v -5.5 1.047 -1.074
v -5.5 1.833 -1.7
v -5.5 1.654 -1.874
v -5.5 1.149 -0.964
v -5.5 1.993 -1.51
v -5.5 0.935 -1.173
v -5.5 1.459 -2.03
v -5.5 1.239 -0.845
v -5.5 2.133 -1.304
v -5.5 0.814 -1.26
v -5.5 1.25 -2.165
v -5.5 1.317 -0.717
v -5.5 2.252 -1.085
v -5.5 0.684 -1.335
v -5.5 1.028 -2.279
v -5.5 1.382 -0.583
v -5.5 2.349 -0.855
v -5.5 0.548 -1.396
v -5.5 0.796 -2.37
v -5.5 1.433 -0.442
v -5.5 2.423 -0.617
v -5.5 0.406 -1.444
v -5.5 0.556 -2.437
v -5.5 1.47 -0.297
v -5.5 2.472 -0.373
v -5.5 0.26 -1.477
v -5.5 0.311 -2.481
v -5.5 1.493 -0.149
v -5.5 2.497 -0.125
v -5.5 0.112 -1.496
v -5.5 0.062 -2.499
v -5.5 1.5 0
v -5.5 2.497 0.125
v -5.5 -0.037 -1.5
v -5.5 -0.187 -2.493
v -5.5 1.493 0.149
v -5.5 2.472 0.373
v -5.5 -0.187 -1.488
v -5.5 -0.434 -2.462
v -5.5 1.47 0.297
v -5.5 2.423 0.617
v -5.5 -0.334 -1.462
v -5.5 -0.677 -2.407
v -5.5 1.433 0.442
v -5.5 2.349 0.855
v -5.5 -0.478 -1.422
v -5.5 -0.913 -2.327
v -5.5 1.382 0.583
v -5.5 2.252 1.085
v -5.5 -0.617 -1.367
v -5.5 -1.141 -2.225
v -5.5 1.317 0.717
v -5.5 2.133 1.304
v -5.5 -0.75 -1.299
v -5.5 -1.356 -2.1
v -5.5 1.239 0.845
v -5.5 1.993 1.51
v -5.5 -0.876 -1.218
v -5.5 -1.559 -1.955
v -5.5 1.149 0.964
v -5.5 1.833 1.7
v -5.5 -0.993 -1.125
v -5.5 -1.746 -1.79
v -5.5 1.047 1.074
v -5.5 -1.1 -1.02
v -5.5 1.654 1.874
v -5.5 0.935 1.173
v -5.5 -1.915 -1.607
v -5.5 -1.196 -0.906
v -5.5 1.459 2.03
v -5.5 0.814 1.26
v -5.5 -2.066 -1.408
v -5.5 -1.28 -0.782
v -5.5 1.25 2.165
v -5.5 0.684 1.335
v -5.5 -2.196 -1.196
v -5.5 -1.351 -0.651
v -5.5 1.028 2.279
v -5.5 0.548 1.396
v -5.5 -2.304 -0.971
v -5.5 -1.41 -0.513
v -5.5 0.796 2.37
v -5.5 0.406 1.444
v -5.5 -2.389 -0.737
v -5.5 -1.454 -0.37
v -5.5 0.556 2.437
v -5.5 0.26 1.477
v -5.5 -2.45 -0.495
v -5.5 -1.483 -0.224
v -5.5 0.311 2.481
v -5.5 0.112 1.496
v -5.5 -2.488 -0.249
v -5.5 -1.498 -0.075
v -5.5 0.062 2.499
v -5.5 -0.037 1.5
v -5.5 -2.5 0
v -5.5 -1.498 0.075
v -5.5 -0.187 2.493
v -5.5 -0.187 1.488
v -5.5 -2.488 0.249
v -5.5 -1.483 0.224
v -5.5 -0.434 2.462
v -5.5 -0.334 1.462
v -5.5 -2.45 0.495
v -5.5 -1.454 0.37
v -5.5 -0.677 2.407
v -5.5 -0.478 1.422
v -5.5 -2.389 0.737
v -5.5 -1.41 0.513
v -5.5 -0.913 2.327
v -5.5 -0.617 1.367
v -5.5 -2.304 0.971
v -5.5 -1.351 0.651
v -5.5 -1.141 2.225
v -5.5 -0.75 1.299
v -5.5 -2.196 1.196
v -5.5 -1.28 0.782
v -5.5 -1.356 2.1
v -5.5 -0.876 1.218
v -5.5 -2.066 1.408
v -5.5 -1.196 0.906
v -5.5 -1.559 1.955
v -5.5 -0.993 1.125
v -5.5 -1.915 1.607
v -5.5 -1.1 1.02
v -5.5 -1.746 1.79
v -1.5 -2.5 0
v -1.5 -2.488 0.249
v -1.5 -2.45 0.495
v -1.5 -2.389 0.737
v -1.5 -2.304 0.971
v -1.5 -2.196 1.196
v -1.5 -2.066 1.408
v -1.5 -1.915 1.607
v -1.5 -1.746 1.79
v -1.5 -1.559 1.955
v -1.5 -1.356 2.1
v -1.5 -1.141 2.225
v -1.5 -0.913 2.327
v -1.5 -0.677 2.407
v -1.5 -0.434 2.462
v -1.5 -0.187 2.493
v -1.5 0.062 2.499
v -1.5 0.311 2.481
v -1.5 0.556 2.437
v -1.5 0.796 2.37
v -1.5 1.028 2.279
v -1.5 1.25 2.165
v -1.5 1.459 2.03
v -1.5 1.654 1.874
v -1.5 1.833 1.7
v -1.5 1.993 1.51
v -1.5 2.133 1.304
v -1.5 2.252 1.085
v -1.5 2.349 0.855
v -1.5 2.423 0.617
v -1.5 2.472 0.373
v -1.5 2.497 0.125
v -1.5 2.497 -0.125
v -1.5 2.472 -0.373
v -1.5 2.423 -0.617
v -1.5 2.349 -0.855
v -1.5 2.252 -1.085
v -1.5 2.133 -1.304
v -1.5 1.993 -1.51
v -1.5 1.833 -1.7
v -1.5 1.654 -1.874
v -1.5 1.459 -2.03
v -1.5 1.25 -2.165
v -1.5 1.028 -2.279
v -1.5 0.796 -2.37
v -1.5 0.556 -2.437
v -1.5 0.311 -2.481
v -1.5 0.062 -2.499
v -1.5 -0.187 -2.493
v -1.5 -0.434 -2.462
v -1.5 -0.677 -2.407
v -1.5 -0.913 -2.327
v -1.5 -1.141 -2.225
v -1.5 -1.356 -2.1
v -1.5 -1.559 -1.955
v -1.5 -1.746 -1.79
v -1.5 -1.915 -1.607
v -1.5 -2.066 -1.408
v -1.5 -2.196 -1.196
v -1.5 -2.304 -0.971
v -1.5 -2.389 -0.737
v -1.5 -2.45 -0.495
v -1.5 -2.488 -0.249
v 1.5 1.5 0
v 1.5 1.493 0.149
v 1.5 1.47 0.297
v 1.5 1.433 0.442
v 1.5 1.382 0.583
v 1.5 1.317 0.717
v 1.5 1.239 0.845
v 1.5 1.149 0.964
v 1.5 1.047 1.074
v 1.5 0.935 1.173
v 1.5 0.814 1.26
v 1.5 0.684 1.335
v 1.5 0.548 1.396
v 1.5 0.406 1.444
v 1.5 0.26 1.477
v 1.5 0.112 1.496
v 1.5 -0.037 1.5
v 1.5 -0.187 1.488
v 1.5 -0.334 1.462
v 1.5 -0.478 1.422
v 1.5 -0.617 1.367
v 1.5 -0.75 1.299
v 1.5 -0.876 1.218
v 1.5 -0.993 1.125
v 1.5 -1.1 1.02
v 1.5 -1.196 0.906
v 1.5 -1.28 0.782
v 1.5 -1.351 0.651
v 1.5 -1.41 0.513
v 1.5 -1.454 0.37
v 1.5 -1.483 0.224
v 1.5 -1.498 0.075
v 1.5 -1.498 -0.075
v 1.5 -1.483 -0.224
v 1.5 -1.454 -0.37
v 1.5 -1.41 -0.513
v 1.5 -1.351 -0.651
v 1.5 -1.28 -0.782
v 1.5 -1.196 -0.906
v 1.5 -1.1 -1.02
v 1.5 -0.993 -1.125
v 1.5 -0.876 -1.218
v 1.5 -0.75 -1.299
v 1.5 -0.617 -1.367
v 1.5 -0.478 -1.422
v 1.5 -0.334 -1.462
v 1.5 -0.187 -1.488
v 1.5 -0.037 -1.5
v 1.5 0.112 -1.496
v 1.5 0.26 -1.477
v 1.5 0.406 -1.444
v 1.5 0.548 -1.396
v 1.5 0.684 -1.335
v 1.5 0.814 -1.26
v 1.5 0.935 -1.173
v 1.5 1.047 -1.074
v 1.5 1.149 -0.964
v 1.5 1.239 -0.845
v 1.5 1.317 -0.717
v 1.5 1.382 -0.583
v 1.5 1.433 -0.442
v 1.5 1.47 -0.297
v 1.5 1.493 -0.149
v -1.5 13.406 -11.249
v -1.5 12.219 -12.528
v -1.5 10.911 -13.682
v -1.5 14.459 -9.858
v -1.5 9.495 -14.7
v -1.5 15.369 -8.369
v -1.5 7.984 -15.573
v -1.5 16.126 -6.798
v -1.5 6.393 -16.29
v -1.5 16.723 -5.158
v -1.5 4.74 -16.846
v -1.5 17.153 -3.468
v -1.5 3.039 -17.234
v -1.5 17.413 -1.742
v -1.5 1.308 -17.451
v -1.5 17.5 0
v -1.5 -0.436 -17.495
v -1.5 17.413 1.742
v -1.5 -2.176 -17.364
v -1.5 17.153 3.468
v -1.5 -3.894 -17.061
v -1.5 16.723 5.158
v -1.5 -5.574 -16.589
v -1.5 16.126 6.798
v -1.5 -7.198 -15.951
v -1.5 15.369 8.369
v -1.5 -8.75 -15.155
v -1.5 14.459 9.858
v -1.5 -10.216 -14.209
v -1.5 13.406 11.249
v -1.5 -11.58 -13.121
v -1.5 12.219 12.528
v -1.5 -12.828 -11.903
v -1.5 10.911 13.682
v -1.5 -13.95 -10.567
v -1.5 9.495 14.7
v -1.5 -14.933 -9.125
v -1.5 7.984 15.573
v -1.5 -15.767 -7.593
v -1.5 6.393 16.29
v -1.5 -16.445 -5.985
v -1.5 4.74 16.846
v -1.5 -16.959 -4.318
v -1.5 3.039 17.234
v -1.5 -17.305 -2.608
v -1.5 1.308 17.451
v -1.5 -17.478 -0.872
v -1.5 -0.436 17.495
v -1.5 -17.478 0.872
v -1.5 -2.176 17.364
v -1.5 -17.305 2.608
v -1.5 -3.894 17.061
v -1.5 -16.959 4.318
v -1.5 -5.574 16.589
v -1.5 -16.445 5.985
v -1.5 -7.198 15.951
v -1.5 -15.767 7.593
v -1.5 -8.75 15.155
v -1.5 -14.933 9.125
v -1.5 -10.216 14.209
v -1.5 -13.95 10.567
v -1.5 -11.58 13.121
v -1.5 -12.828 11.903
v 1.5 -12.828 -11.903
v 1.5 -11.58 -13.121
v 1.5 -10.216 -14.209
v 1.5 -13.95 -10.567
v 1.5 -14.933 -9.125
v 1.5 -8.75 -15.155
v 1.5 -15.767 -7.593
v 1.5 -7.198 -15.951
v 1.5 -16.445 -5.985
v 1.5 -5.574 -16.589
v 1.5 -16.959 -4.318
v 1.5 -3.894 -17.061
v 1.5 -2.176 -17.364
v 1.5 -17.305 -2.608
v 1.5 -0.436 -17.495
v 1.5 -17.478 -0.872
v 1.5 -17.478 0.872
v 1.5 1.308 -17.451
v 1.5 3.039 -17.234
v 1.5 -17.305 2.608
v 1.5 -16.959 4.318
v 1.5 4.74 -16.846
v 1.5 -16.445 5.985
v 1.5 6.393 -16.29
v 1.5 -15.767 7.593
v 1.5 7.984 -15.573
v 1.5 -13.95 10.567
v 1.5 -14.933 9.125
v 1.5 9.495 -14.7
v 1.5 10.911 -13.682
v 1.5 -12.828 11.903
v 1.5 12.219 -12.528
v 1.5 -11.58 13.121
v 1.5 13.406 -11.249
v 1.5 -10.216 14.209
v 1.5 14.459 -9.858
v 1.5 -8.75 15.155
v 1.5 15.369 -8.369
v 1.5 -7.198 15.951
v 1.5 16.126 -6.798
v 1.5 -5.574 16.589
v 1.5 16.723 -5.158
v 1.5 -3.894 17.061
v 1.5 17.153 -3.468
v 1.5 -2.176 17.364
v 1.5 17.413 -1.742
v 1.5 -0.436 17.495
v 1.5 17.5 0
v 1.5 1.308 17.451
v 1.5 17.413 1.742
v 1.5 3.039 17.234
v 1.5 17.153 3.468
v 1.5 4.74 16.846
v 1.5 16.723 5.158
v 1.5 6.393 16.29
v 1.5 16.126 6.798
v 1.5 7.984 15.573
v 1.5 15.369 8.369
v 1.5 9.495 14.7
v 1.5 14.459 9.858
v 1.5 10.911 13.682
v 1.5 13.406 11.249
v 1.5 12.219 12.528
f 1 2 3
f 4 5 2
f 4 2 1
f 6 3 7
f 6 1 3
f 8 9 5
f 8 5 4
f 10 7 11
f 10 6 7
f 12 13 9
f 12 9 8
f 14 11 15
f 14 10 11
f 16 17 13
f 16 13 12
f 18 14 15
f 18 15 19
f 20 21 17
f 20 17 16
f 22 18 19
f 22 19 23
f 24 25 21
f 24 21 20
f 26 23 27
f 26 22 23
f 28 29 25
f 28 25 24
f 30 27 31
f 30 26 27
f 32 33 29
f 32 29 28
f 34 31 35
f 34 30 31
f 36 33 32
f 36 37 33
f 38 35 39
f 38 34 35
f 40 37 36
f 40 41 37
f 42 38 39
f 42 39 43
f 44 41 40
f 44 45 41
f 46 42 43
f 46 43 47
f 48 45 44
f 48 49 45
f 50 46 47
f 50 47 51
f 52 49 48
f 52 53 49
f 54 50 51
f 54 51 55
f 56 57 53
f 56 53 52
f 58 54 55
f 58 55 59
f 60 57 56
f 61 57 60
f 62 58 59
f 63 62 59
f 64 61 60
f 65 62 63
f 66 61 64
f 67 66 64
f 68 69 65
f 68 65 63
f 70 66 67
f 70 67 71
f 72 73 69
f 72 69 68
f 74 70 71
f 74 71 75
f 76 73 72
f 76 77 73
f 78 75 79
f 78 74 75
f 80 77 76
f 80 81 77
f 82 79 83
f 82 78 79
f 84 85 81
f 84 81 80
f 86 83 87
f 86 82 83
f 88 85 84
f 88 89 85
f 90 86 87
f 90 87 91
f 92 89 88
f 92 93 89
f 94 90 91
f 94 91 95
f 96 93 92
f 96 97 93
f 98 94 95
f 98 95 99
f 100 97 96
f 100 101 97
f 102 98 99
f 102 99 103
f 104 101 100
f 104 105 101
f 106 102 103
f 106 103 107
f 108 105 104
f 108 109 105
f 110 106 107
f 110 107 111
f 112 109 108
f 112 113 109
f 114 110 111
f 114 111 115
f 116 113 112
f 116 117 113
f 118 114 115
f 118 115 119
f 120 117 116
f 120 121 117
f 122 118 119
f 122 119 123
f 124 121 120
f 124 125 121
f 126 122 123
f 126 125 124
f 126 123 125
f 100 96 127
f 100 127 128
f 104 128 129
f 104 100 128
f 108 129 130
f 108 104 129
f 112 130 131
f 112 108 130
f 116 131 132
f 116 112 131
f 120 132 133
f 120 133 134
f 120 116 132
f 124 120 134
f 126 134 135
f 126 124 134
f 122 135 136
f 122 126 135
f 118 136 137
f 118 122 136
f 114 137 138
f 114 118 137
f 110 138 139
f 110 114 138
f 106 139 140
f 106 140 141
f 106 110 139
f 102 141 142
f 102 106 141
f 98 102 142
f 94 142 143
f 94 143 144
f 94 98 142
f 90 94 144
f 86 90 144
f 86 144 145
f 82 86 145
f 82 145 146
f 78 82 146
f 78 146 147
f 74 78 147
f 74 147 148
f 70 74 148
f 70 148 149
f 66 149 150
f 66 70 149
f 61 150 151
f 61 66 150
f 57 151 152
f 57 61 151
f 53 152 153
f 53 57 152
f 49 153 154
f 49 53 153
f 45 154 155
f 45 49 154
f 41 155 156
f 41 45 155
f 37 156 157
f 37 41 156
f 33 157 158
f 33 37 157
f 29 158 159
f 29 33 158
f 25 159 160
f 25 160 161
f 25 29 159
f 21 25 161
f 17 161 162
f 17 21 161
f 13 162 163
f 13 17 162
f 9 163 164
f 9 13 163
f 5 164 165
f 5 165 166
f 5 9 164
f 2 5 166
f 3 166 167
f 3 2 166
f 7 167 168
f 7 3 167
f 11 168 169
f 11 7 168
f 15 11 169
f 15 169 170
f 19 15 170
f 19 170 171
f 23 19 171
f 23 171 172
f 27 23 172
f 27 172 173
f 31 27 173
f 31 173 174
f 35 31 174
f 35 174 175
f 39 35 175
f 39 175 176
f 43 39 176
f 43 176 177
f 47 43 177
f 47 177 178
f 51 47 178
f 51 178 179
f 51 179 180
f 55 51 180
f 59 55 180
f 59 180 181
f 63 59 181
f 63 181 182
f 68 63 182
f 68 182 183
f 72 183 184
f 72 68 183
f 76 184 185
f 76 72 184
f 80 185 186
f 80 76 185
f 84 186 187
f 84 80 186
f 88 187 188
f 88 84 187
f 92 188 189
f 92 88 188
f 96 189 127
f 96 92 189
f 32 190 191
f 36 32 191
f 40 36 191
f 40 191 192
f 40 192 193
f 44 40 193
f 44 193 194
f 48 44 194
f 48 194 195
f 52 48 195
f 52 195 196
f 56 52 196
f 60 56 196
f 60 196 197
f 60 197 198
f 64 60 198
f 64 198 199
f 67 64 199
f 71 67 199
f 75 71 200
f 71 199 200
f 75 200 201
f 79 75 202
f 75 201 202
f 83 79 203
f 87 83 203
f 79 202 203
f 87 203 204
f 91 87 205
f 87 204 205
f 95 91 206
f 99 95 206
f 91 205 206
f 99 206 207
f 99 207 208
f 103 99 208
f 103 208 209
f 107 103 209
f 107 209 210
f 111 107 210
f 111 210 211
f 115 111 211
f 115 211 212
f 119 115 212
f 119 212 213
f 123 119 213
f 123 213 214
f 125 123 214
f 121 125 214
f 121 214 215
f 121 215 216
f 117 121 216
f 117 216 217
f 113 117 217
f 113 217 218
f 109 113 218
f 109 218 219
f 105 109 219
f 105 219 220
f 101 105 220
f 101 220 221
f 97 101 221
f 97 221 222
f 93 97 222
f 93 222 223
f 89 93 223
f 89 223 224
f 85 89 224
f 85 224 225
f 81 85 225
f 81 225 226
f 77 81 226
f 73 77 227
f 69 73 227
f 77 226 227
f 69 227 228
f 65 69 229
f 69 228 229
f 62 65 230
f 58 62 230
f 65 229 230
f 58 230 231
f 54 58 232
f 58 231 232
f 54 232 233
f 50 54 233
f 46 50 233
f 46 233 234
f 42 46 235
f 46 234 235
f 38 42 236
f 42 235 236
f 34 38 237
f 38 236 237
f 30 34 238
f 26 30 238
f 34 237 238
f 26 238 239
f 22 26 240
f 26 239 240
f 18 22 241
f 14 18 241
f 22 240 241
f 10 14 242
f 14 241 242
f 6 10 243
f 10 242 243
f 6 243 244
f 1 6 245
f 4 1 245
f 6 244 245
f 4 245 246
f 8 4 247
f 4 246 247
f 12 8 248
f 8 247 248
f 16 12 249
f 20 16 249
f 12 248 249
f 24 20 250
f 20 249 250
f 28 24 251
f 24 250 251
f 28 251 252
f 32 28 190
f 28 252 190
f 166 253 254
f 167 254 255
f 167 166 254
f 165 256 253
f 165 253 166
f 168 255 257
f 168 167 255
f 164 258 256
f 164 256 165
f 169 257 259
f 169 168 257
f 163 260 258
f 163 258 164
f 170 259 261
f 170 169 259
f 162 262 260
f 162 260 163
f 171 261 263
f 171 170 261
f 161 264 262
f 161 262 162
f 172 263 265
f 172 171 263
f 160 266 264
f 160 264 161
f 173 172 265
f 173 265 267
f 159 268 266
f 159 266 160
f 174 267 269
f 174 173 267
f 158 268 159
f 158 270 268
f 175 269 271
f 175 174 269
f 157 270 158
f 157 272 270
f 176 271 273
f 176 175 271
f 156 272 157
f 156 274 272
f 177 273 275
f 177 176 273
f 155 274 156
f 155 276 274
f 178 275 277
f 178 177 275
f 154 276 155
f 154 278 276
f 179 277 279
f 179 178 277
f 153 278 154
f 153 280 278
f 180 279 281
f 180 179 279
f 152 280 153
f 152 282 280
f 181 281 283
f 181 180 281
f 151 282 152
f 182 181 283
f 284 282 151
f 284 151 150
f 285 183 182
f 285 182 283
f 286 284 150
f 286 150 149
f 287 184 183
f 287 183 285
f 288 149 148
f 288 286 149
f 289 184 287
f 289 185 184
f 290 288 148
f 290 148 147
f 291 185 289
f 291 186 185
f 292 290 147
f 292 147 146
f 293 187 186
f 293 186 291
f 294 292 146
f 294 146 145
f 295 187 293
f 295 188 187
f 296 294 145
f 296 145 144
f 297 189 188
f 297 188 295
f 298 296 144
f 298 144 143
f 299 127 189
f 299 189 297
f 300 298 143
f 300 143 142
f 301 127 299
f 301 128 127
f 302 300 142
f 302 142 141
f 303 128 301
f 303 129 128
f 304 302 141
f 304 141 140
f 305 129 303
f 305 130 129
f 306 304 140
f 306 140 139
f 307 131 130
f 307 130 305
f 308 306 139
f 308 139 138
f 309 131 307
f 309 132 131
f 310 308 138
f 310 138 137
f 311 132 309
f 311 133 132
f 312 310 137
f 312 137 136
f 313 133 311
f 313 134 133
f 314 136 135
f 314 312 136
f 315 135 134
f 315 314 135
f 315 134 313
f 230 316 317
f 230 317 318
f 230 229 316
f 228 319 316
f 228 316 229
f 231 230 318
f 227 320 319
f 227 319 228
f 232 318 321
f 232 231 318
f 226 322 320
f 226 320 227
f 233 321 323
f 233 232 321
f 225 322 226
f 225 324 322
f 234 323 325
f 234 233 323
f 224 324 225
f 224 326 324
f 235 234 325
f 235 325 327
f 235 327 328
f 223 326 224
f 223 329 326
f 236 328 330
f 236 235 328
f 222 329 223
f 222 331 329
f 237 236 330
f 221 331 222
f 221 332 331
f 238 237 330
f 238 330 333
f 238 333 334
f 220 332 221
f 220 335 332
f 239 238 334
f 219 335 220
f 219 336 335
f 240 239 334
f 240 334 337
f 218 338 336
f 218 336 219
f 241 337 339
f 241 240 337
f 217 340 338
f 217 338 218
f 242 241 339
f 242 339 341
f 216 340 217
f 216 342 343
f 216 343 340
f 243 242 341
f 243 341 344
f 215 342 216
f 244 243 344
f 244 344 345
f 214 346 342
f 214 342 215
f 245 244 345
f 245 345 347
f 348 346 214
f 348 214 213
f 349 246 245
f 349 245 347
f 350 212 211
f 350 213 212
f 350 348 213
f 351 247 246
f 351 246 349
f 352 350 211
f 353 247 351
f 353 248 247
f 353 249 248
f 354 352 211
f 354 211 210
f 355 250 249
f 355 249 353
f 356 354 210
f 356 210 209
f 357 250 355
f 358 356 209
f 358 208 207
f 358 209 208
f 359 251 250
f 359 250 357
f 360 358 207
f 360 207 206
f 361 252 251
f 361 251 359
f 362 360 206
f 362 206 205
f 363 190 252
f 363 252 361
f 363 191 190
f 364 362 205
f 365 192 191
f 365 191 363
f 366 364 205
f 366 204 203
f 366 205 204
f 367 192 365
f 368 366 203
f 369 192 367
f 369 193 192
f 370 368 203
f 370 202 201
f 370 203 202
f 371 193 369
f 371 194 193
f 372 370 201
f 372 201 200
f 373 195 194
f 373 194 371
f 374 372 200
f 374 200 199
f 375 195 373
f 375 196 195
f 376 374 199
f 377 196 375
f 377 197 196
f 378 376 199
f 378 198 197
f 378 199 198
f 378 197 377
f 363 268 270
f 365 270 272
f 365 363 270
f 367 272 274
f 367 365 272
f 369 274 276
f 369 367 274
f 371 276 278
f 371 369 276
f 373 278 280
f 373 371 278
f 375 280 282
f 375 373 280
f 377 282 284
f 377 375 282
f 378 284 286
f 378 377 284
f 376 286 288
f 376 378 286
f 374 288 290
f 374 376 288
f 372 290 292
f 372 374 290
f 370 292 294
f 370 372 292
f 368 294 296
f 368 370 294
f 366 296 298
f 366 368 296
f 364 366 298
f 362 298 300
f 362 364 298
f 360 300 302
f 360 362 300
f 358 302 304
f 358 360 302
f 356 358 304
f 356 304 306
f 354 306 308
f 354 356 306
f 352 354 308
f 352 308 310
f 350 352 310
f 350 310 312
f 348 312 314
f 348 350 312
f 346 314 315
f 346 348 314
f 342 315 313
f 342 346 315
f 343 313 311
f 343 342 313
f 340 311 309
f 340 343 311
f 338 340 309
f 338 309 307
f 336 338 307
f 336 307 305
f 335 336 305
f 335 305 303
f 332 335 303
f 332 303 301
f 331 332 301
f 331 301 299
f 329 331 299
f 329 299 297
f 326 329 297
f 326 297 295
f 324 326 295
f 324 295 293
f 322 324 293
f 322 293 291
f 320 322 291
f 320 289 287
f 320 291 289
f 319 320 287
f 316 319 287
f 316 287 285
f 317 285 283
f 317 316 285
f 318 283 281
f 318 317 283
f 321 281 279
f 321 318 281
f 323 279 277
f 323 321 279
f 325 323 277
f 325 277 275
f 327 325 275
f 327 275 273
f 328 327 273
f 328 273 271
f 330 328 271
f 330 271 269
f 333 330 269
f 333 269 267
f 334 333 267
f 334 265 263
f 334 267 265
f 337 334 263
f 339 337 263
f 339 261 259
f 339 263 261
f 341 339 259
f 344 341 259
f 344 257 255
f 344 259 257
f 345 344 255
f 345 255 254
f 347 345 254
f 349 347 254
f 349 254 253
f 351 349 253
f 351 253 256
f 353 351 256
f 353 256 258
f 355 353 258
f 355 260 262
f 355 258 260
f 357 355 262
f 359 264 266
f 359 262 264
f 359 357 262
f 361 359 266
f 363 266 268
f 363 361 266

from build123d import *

# Parameters (mm, degrees)
F0_R      = 19.5
F1_DEPTH  = 7.5
F3_R      = 17.5
F4_DEPTH  = 2
F2_R      = 17.5
F5_DEPTH  = 2
F6_R      = 1.5
F7_DEPTH  = 25
F8_R      = 17.5
F8_R_2    = 2.5
F9_DEPTH  = 4
F10_R     = 17.5
F10_R_2   = 2.5
F11_DEPTH = 4
F12_R     = 20
F12_R_2   = 19.5
F12_R_3   = 17.5
F13_DEPTH = 25
F14_DEPTH = 4


with BuildPart() as f1:
    # F0 (on Right) → F1 (new body, symmetric)
    with BuildSketch(Plane.YZ):
        Circle(F0_R)
    extrude(amount=F1_DEPTH, both=True)

    # F3 (on face) → F4 (cut)
    with BuildSketch(Plane(origin=(-7.5, 0, 0), x_dir=(0, -1, 0), z_dir=(-1, 0, 0))):
        Circle(F3_R)
    extrude(amount=-F4_DEPTH, mode=Mode.SUBTRACT)

    # F2 (on face) → F5 (cut)
    with BuildSketch(Plane.YZ.offset(7.5)):
        Circle(F2_R)
    extrude(amount=-F5_DEPTH, mode=Mode.SUBTRACT)

    # F6 (on face) → F7 (cut)
    with BuildSketch(Plane.YZ.offset(5.5)):
        Circle(F6_R)
    extrude(amount=-F7_DEPTH, mode=Mode.SUBTRACT)

    # F8 (on face) → F9 (cut)
    with BuildSketch(Plane.YZ.offset(5.5)):
        Circle(F8_R)
        Circle(F8_R_2, mode=Mode.SUBTRACT)
    extrude(amount=-F9_DEPTH, mode=Mode.SUBTRACT)

    # F10 (on face) → F11 (cut)
    with BuildSketch(Plane(origin=(-5.5, 0, 0), x_dir=(0, -1, 0), z_dir=(-1, 0, 0))):
        Circle(F10_R)
        Circle(F10_R_2, mode=Mode.SUBTRACT)
    extrude(amount=-F11_DEPTH, mode=Mode.SUBTRACT)

    # F12 (on face) → F13 (cut)
    with BuildSketch(Plane.YZ.offset(7.5)):
        Circle(F12_R)
        Circle(F12_R_2, mode=Mode.SUBTRACT)
        Circle(F12_R_2)
        Circle(F12_R_3, mode=Mode.SUBTRACT)
    extrude(amount=-F13_DEPTH, mode=Mode.SUBTRACT)

    # F14 (cut): a face of the model
    f14_faces = [f1.faces().sort_by_distance(p)[0] for p in [
        (5.5, -2.4292893219, 0),
    ]]
    extrude(f14_faces, amount=-F14_DEPTH, mode=Mode.SUBTRACT)


solid = f1.part
